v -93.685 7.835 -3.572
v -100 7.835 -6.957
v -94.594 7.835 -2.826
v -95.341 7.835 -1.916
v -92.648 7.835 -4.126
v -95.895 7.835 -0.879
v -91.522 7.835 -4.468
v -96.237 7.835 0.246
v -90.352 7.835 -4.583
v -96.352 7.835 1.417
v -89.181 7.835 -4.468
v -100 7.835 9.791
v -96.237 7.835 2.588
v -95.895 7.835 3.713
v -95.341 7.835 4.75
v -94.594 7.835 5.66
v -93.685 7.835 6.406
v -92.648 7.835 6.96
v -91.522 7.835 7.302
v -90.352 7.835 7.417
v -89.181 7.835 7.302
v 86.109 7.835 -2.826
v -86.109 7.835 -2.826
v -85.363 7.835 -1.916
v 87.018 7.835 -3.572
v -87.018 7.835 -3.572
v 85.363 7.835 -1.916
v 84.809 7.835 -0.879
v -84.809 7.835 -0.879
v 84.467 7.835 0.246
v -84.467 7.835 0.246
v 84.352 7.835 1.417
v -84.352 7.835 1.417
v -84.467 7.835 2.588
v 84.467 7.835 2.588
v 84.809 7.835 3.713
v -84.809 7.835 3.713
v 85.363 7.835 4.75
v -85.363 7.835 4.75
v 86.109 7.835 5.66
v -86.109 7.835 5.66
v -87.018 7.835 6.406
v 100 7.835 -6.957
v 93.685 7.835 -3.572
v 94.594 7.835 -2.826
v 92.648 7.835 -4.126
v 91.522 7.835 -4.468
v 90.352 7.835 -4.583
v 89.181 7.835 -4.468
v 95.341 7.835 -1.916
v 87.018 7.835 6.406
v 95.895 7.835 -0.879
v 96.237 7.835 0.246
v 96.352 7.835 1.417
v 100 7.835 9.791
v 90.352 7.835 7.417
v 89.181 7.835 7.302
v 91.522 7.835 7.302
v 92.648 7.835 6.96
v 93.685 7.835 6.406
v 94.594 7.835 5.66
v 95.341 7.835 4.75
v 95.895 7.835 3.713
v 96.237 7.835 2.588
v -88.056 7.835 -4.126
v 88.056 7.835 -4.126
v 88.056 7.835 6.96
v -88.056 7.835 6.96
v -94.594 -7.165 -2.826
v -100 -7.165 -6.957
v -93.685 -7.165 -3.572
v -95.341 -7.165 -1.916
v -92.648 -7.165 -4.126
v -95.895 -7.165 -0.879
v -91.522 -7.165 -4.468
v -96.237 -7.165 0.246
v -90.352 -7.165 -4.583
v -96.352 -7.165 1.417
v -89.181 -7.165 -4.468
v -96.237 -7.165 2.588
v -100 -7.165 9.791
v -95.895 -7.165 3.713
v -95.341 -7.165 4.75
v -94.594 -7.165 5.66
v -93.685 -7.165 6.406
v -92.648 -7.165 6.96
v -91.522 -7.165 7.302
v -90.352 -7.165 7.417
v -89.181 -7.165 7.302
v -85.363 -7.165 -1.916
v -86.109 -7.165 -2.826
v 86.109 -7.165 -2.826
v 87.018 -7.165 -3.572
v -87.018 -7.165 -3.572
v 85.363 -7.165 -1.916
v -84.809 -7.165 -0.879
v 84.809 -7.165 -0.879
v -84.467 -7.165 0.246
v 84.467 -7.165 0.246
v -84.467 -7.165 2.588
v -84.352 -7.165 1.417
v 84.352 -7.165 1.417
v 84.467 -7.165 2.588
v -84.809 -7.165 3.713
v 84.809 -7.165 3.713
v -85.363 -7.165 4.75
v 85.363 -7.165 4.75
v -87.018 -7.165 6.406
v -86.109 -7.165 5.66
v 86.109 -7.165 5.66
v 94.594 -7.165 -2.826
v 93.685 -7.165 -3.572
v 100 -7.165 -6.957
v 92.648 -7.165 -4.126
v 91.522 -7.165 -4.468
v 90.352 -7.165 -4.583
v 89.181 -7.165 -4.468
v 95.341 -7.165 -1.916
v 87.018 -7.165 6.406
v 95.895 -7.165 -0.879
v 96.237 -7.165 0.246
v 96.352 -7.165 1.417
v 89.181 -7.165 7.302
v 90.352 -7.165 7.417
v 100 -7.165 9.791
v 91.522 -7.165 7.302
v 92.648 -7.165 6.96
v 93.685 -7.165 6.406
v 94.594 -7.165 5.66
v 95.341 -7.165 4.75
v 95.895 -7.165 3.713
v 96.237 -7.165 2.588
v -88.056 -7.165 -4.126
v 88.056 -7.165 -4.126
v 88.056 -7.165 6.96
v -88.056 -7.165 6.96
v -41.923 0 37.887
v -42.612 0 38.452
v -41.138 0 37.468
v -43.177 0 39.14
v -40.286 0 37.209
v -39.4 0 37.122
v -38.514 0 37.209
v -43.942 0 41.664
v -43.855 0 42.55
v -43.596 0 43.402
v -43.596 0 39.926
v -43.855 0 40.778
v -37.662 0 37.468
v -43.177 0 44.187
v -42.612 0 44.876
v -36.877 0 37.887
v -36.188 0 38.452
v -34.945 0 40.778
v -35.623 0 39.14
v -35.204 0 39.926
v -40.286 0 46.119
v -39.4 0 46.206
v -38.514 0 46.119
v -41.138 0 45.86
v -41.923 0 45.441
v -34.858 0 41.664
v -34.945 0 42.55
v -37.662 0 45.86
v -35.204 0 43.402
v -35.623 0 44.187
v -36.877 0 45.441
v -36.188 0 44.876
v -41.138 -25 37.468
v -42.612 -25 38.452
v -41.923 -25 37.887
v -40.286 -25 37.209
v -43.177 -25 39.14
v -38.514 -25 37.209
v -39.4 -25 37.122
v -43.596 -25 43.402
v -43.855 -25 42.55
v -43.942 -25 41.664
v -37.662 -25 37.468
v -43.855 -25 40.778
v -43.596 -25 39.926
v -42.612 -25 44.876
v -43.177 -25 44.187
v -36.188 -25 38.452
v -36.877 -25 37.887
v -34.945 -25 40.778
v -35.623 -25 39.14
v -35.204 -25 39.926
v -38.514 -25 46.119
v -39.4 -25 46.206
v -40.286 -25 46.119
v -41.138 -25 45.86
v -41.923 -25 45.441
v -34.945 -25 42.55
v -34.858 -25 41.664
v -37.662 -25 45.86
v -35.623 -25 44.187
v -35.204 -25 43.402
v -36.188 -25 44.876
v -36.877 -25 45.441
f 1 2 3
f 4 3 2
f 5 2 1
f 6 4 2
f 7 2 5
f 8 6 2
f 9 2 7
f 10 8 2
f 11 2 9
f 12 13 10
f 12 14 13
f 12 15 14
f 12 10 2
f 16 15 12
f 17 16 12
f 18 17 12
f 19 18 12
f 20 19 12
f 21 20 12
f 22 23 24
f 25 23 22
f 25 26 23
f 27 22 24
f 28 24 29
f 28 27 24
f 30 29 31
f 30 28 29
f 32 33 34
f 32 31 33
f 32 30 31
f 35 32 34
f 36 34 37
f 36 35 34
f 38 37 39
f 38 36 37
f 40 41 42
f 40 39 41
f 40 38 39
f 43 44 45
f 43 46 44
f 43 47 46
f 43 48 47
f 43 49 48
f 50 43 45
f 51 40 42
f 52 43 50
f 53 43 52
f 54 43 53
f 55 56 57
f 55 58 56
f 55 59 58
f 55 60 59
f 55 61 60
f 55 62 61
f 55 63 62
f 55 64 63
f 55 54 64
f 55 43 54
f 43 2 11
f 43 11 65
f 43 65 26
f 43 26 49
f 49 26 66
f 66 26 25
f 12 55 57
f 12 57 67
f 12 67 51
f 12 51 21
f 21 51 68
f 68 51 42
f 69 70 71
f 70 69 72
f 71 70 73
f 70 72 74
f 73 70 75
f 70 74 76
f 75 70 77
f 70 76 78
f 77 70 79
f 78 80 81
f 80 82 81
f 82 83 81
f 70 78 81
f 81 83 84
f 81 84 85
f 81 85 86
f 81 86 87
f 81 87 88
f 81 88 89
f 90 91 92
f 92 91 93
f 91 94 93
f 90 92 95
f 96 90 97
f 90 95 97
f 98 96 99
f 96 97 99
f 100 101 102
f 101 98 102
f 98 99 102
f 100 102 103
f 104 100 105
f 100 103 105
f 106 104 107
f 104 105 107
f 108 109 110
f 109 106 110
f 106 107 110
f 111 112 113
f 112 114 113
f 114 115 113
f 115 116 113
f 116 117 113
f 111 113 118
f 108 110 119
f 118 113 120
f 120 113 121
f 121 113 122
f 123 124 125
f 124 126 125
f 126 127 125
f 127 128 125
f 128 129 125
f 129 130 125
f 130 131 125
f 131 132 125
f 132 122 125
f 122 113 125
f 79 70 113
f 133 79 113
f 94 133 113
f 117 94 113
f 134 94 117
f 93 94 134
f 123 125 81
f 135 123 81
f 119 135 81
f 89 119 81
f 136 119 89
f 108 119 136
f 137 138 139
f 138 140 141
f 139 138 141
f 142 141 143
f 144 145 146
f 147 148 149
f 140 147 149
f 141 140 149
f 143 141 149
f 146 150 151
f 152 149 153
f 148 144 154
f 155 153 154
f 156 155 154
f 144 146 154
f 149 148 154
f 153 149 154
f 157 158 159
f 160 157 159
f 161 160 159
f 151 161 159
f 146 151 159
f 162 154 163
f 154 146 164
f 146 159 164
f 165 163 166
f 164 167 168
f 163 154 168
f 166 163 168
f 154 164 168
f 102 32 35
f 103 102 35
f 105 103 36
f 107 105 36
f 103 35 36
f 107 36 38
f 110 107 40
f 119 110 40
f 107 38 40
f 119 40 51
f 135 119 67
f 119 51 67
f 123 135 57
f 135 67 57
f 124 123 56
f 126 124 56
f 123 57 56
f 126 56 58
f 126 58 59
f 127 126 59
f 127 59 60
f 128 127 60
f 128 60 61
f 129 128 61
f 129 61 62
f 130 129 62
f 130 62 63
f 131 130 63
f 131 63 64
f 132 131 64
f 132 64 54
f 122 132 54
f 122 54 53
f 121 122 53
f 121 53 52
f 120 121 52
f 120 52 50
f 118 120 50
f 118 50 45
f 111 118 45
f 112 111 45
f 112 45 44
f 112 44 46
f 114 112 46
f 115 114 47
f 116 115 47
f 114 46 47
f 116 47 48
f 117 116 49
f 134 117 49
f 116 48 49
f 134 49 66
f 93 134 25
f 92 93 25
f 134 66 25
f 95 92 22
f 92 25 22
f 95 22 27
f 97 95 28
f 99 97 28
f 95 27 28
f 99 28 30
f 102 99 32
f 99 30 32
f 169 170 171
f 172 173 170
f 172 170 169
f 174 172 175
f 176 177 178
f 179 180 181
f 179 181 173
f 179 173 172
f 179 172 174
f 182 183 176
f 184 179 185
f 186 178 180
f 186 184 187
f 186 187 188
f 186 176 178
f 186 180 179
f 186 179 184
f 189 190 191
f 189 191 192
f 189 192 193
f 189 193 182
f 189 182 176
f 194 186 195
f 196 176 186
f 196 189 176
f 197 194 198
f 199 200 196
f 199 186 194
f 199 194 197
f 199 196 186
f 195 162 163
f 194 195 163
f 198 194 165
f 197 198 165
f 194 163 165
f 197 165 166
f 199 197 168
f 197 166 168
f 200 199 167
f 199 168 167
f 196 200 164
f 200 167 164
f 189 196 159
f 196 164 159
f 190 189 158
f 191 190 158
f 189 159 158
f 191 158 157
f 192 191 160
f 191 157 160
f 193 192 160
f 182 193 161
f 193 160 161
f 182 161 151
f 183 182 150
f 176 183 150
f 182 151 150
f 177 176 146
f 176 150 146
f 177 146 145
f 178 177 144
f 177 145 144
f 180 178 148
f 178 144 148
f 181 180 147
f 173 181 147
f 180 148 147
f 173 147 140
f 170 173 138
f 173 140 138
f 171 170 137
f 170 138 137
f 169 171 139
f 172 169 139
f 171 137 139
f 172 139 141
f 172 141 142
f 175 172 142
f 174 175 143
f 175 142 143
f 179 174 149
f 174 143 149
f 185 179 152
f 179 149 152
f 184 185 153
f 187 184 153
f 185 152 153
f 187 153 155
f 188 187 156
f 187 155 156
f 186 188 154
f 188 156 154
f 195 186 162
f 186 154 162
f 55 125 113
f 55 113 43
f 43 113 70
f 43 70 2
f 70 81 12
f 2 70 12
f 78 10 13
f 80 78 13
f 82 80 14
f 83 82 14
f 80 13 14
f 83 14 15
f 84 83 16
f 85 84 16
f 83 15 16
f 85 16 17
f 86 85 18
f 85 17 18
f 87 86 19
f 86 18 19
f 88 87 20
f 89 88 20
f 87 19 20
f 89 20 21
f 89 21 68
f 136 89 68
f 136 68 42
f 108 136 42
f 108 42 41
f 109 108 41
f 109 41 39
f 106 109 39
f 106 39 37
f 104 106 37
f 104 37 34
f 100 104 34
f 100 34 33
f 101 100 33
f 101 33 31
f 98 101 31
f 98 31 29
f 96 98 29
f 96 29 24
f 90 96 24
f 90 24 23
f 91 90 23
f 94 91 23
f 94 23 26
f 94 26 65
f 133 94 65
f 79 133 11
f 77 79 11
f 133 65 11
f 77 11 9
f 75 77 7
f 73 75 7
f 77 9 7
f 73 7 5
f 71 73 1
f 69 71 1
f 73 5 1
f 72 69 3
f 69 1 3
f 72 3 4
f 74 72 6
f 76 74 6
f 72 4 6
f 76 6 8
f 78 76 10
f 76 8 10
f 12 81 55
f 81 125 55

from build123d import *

# Parameters (mm, degrees)
F0_W     = 15
F0_H     = 16.748667
F1_DEPTH = 100
F3_D     = 12
F4_R     = 4.542087
F5_DEPTH = 25


with BuildPart() as f1:
    # F0 (on Right) → F1 (new body, symmetric)
    with BuildSketch(Plane.YZ):
        with Locations((0.335367, 1.416986)):
            Rectangle(F0_W, F0_H)
    extrude(amount=F1_DEPTH, both=True)

    # F3 (through all)
    with Locations(Plane.XZ.offset(7.164633)):
        with Locations((90.351857, 1.416985), (-90.351857, 1.416985)):
            Hole(F3_D / 2)


with BuildPart() as f5:
    # F4 (on Front) → F5 (new body)
    with BuildSketch(Plane.XZ):
        with Locations((-39.399955, 41.663915)):
            Circle(F4_R)
    extrude(amount=F5_DEPTH)


solid = Compound([f1.part, f5.part])
